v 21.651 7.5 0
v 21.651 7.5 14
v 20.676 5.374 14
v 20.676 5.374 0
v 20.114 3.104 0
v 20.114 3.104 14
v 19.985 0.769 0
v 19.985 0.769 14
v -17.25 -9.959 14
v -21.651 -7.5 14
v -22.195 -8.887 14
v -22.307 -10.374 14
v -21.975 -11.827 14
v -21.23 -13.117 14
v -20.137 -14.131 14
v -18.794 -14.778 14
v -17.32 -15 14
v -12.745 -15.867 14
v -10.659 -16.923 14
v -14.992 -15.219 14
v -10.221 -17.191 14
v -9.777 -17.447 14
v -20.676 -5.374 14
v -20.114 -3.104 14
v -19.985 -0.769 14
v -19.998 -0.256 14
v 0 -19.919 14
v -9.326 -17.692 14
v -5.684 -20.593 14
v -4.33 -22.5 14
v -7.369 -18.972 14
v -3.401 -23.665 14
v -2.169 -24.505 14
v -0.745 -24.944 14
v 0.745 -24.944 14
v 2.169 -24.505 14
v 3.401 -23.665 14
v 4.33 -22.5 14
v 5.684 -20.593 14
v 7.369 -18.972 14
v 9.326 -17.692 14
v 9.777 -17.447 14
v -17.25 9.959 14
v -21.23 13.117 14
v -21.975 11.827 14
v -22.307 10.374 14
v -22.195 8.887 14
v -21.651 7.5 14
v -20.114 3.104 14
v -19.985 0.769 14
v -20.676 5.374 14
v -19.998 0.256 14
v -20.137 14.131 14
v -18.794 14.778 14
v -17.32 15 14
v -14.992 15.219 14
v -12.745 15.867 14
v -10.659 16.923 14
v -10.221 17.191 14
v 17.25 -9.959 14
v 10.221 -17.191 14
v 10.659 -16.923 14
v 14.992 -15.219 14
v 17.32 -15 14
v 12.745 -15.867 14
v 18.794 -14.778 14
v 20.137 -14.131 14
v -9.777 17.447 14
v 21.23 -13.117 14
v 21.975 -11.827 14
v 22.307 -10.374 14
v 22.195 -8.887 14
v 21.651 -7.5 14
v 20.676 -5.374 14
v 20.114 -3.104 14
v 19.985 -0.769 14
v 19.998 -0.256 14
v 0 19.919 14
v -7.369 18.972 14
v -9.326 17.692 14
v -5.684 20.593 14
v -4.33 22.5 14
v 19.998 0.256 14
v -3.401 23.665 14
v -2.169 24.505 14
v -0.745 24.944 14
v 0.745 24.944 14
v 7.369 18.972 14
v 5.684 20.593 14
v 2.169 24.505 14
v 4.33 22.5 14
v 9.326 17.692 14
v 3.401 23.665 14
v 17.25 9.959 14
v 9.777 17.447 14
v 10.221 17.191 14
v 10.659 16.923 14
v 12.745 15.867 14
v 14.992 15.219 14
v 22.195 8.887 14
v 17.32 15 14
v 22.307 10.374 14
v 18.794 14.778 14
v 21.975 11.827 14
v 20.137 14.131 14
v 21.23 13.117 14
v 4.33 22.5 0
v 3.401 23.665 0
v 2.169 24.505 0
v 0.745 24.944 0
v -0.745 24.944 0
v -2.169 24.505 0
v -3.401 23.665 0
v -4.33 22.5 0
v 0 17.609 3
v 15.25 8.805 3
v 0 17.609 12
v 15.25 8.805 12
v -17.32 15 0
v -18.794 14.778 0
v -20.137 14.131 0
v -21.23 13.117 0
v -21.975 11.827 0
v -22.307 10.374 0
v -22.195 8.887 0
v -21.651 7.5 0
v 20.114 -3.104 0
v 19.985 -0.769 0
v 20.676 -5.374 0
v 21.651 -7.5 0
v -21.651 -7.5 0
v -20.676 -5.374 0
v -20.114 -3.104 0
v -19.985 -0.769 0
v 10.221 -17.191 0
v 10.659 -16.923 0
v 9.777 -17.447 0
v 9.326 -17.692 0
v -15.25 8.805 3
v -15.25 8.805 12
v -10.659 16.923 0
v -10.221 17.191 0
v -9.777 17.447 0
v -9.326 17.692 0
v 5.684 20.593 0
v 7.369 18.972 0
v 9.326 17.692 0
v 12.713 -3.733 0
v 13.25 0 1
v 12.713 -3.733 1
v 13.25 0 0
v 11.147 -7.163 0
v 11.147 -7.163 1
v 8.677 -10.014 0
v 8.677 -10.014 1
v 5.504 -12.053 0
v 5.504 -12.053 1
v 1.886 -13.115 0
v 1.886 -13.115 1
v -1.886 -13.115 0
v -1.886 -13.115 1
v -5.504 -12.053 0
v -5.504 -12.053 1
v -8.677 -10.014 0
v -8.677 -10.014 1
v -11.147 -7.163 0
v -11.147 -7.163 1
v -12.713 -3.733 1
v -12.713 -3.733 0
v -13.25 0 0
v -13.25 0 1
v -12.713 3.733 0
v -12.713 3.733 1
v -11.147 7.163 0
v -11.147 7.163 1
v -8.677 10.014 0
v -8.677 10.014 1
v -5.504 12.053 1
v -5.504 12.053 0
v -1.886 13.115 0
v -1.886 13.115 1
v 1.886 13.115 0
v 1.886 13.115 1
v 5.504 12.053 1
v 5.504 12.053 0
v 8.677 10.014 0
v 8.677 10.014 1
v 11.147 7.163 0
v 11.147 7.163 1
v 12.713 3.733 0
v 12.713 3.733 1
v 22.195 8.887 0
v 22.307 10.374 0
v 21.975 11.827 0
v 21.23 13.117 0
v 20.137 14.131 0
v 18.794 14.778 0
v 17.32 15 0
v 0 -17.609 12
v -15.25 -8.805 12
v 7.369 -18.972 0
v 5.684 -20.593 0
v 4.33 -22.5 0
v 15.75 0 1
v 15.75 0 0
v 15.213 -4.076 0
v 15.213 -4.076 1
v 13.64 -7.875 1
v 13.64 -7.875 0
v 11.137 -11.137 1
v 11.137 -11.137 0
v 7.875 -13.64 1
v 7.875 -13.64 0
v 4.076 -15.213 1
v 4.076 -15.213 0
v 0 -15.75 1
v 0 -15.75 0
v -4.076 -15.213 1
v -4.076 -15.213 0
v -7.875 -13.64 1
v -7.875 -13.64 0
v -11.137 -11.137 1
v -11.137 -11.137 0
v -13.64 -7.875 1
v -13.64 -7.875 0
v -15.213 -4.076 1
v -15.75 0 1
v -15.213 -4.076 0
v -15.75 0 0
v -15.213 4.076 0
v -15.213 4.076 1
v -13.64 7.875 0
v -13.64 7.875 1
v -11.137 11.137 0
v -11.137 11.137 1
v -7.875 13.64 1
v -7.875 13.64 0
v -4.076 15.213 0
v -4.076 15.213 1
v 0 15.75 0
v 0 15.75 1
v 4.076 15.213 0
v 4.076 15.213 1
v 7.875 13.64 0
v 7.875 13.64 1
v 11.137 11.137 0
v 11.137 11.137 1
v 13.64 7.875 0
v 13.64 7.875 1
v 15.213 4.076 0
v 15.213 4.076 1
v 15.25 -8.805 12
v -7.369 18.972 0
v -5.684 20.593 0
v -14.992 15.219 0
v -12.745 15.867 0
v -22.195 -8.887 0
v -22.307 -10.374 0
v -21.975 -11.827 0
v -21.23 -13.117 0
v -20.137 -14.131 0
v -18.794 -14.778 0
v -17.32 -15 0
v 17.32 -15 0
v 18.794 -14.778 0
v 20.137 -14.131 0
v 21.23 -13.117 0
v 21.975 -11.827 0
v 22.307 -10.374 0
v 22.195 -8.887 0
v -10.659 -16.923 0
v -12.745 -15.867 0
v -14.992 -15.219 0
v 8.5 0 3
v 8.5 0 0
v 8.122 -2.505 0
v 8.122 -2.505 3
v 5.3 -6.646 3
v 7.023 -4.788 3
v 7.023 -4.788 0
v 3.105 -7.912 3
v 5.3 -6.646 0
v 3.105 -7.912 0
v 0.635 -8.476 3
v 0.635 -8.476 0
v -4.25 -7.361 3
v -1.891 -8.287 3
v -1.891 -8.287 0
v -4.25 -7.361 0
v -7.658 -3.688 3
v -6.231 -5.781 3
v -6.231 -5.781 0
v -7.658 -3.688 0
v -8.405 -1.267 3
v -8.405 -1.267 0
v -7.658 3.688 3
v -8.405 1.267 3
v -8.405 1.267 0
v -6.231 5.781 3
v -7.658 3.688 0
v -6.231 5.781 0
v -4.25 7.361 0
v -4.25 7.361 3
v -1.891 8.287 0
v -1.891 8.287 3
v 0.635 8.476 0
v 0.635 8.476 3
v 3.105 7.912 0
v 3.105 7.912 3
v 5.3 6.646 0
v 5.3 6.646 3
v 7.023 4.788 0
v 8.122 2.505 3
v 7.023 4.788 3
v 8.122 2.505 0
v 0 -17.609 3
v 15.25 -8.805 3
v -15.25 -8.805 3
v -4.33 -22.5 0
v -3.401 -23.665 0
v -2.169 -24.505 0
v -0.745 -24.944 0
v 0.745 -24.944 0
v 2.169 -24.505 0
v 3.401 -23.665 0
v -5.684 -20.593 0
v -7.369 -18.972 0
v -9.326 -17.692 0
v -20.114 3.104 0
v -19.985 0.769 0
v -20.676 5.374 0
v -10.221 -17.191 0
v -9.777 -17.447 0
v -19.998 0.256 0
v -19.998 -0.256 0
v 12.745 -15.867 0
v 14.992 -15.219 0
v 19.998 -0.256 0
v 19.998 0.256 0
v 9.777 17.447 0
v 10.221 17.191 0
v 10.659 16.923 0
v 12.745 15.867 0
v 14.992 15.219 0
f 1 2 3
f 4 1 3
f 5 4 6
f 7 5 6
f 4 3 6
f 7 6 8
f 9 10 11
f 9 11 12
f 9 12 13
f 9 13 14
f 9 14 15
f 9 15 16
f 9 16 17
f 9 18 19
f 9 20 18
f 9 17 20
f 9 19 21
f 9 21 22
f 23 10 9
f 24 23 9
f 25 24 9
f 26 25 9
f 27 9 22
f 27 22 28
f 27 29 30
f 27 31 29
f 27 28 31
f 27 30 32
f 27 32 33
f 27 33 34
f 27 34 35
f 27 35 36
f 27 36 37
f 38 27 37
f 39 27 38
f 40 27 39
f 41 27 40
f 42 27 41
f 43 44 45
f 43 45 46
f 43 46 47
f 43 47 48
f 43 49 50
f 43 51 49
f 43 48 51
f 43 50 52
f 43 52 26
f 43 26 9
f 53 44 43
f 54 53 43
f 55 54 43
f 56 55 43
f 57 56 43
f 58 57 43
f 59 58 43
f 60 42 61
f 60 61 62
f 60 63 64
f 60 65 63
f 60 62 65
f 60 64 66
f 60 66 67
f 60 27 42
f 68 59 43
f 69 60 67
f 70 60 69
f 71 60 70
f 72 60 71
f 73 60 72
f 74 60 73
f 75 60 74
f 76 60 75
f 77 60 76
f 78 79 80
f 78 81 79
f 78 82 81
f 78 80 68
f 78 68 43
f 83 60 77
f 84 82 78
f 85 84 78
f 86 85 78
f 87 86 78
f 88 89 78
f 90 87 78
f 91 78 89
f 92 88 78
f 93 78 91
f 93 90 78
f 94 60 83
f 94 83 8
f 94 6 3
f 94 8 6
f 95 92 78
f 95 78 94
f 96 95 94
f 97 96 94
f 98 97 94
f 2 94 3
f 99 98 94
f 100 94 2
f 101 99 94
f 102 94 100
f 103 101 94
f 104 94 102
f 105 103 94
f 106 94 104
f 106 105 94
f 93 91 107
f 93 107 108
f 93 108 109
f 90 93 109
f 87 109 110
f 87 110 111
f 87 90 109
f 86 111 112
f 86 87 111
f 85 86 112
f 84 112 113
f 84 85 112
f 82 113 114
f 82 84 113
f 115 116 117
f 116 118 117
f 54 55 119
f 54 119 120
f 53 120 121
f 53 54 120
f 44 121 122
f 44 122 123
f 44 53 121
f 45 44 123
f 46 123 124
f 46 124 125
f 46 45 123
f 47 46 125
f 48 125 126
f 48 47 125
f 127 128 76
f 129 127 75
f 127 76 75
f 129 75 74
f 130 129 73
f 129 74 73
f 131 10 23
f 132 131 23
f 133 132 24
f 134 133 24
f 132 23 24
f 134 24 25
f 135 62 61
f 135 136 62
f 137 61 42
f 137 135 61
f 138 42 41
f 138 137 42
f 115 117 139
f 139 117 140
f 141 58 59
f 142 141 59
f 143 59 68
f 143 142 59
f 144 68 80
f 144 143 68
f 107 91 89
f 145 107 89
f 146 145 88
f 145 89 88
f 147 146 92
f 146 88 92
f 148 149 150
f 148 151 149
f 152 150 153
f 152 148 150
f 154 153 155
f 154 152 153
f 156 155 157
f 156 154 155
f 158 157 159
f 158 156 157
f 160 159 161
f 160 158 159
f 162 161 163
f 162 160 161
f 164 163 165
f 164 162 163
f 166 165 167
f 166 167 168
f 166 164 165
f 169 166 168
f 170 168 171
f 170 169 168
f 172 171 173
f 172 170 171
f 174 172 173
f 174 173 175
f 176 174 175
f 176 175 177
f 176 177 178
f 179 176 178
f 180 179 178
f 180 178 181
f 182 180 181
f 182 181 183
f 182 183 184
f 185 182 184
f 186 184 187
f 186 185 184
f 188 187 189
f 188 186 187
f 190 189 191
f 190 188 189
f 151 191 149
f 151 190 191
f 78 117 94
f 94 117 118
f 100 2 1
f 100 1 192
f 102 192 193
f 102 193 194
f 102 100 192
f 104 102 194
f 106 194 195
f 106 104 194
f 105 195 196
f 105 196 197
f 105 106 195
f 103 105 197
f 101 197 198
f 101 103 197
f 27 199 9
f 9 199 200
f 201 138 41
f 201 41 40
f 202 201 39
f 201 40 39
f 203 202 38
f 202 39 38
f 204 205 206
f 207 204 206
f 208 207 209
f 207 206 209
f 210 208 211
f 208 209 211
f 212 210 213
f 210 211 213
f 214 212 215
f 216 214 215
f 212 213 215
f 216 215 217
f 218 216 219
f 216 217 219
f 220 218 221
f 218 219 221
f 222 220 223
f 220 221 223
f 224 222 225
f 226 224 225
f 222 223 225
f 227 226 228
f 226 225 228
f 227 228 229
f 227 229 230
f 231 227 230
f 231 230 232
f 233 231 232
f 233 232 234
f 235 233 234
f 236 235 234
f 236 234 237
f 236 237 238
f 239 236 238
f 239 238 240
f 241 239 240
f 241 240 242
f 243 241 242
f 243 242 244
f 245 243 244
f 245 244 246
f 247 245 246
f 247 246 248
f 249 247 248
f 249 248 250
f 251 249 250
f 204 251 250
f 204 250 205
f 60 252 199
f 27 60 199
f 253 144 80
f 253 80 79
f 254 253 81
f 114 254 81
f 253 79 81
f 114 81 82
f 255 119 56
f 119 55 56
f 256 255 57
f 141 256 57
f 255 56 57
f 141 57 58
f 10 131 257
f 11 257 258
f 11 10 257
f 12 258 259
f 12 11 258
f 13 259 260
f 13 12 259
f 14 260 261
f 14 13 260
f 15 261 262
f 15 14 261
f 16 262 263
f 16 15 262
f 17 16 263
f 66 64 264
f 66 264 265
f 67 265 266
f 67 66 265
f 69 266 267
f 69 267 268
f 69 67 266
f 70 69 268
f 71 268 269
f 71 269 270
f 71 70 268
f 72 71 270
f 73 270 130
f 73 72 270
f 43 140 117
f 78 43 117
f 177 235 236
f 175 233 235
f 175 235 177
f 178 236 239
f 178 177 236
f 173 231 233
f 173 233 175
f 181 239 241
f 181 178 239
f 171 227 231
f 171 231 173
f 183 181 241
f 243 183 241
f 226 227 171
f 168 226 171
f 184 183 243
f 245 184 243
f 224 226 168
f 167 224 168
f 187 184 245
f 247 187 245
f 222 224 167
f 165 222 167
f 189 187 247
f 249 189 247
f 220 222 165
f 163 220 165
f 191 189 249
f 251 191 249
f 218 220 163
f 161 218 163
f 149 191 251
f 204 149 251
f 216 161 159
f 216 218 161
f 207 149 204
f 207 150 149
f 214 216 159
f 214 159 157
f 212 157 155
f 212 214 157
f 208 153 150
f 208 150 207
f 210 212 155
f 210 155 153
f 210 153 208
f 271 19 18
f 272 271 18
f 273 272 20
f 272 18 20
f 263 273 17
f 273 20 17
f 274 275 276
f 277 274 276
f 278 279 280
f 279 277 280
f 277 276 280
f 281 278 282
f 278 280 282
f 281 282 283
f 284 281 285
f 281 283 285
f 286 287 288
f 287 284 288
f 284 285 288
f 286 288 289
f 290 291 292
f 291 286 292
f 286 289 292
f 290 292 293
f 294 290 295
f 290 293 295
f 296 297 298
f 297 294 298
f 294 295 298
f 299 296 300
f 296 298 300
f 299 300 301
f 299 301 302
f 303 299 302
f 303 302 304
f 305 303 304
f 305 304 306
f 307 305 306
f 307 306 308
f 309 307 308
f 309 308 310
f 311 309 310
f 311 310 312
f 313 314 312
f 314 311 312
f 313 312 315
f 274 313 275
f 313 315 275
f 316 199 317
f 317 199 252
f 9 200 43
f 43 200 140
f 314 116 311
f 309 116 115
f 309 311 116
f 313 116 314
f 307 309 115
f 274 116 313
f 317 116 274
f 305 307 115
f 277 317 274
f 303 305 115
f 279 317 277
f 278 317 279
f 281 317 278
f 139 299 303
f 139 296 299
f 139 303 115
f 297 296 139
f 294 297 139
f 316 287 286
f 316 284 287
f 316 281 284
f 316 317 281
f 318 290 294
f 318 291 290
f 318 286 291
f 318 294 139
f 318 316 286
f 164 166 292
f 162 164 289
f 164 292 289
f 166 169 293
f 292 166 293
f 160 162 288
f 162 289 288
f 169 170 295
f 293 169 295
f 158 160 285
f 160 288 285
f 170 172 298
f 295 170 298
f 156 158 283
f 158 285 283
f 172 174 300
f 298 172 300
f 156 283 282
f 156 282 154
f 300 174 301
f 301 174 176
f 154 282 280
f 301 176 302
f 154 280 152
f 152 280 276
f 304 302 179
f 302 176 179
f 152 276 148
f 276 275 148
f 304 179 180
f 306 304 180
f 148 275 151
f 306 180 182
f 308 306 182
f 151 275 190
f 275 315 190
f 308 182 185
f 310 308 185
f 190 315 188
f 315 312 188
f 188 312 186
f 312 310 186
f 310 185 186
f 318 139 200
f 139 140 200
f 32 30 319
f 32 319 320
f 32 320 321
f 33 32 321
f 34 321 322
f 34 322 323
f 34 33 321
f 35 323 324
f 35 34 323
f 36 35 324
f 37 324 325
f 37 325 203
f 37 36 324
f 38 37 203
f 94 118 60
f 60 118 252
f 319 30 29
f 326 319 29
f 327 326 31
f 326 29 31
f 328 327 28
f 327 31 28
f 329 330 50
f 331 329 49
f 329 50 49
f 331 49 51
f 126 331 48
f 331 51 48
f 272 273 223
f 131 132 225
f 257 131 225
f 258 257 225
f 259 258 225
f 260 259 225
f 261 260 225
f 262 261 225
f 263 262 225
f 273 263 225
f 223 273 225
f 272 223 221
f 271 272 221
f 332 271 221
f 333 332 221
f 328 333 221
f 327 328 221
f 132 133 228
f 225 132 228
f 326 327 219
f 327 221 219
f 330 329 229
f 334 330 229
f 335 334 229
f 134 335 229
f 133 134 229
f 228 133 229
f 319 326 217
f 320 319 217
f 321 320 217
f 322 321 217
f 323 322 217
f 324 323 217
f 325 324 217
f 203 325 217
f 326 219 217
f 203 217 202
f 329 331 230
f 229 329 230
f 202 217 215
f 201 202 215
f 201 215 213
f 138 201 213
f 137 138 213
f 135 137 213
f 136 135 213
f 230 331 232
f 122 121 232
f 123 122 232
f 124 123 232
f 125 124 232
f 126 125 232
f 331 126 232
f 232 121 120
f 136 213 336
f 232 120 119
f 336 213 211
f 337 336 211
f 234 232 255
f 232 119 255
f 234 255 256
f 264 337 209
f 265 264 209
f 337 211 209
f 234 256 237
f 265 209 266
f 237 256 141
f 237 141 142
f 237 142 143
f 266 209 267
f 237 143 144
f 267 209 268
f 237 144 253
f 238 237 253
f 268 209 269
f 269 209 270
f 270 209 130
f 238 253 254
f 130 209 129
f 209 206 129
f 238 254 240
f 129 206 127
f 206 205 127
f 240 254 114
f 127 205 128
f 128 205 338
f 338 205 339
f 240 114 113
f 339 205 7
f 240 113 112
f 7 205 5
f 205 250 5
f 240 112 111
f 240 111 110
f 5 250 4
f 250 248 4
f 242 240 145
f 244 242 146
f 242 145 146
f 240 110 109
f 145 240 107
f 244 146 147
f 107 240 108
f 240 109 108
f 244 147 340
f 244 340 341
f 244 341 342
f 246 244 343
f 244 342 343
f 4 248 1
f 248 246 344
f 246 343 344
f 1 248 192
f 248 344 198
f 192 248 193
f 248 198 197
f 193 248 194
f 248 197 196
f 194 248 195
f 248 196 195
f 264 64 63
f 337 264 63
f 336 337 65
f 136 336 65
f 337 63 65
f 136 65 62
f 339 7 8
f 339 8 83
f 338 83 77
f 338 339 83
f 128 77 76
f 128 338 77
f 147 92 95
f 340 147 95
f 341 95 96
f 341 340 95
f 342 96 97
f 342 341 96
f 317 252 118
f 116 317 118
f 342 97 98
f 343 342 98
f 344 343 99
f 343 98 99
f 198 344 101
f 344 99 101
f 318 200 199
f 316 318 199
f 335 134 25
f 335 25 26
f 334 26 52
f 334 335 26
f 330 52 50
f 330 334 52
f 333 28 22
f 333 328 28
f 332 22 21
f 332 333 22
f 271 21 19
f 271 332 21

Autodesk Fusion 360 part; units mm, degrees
sketch "Sketch1" plane through (0, 0, 0) normal (0, 0, 1) x (1, 0, 0)
  circle A0 centre (0, 0) radius 8.5
  circle A1 centre (0, 0) radius 20
  dimension "d1" = 17
  dimension "d2" = 40
extrude "Extrude1" add sketch "Sketch1" along normal blind 14
sketch "Sketch2" plane through (0, 0, 14) normal (0, 0, 1) x (-1, 0, 0)
  circle A0 centre (0, 0) radius 8.5
  circle A1 centre (0, 0) radius 20
  line L0 (-15.25, -8.8046) -> (0, -17.6092)
  line L1 (0, -17.6092) -> (15.25, -8.8046)
  line L2 (15.25, -8.8046) -> (15.25, 8.8046)
  line L3 (15.25, 8.8046) -> (0, 17.6092)
  line L4 (0, 17.6092) -> (-15.25, 8.8046)
  line L5 (-15.25, 8.8046) -> (-15.25, -8.8046)
  line L6 (0, 0) -> (0, -24.7489) construction
  dimension "d5" = 15.25
extrude "Extrude2" cut sketch "Sketch2" against normal blind 11 contours L0 L1 L2 L3 L4 L5
sketch "Sketch3" plane through (0, 0, 14) normal (0, 0, 1) x (-1, 0, 0)
  line L0 (0, -17.6092) -> (-15.25, -8.8046)
  line L1 (-15.25, -8.8046) -> (-15.25, 8.8046)
  line L2 (-15.25, 8.8046) -> (0, 17.6092)
  line L3 (0, 17.6092) -> (15.25, 8.8046)
  line L4 (15.25, 8.8046) -> (15.25, -8.8046)
  line L5 (15.25, -8.8046) -> (0, -17.6092)
  circle A0 centre (0, 0) radius 20
  line L6 (0, -20) -> (0, 20) construction
  line L7 (20, 0) -> (-20, 0) construction
  arc A1 (-4.3301, -22.5) -> (4.3301, -22.5) centre (0, -20) ccw
  line L8 (0, -20) -> (0, -25) construction
  line L9 (0, -20) -> (4.3301, -22.5) construction
  line L10 (0, -20) -> (-4.3301, -22.5) construction
  arc A2 (9.3264, -17.6923) -> (4.3301, -22.5) centre (15.1554, -28.75) ccw
  arc A3 (-4.3301, -22.5) -> (-9.3264, -17.6923) centre (-15.1554, -28.75) ccw
  arc A4 (-9.3264, -17.6923) -> (9.3264, -17.6923) centre (0, 0) ccw
  arc A5 (17.3205, -15) -> (21.6506, -7.5) centre (17.3205, -10) ccw
  arc A6 (17.3205, -15) -> (10.6588, -16.9231) centre (17.3205, -27.5) ccw
  arc A7 (10.6588, -16.9231) -> (19.9852, -0.7692) centre (0, 0) ccw
  arc A8 (19.9852, -0.7692) -> (21.6506, -7.5) centre (32.476, -1.25) ccw
  arc A9 (21.6506, 7.5) -> (17.3205, 15) centre (17.3205, 10) ccw
  arc A10 (21.6506, 7.5) -> (19.9852, 0.7692) centre (32.476, 1.25) ccw
  arc A11 (19.9852, 0.7692) -> (10.6588, 16.9231) centre (0, 0) ccw
  arc A12 (10.6588, 16.9231) -> (17.3205, 15) centre (17.3205, 27.5) ccw
  arc A13 (4.3301, 22.5) -> (-4.3301, 22.5) centre (0, 20) ccw
  arc A14 (4.3301, 22.5) -> (9.3264, 17.6923) centre (15.1554, 28.75) ccw
  arc A15 (9.3264, 17.6923) -> (-9.3264, 17.6923) centre (0, 0) ccw
  arc A16 (-9.3264, 17.6923) -> (-4.3301, 22.5) centre (-15.1554, 28.75) ccw
  arc A17 (-17.3205, 15) -> (-21.6506, 7.5) centre (-17.3205, 10) ccw
  arc A18 (-17.3205, 15) -> (-10.6588, 16.9231) centre (-17.3205, 27.5) ccw
  arc A19 (-10.6588, 16.9231) -> (-19.9852, 0.7692) centre (0, 0) ccw
  arc A20 (-19.9852, 0.7692) -> (-21.6506, 7.5) centre (-32.476, 1.25) ccw
  arc A21 (-21.6506, -7.5) -> (-17.3205, -15) centre (-17.3205, -10) ccw
  arc A22 (-21.6506, -7.5) -> (-19.9852, -0.7692) centre (-32.476, -1.25) ccw
  arc A23 (-19.9852, -0.7692) -> (-10.6588, -16.9231) centre (0, 0) ccw
  arc A24 (-10.6588, -16.9231) -> (-17.3205, -15) centre (-17.3205, -27.5) ccw
  dimension "d10" = 60
  dimension "d11" = 60
  dimension "d12" = 5
  dimension "d14" = 360
extrude "Extrude3" add sketch "Sketch3" against normal up to surface (14 mm away) contours A0 A9 A10 A11 A12 | A0 A5 A6 A7 A8 | A0 A13 A14 A15 A16 | A0 A1 A2 A3 A4 | A0 A17 A18 A19 A20 | A0 A21 A22 A23 A24
chamfer "Chamfer1" distance 2 angle 45 6 edges at (-7.625, 13.2069, 14) (-15.25, 0, 14) (-7.625, -13.2069, 14) (7.625, -13.2069, 14) (15.25, 0, 14) (7.625, 13.2069, 14)
sketch "Sketch4" plane through (0, 0, 0) normal (0, 0, -1) x (1, 0, 0)
  circle A0 centre (0, 0) radius 8.5
  arc A1 (-9.3264, 17.6923) -> (-10.6588, 16.9231) centre (0, 0) ccw
  arc A2 (-17.3205, 15) -> (-10.6588, 16.9231) centre (-17.3205, 27.5) ccw
  arc A3 (-17.3205, 15) -> (-21.6506, 7.5) centre (-17.3205, 10) ccw
  arc A4 (-19.9852, 0.7692) -> (-21.6506, 7.5) centre (-32.476, 1.25) ccw
  arc A5 (-19.9852, 0.7692) -> (-19.9852, -0.7692) centre (0, 0) ccw
  arc A6 (-21.6506, -7.5) -> (-19.9852, -0.7692) centre (-32.476, -1.25) ccw
  arc A7 (-21.6506, -7.5) -> (-17.3205, -15) centre (-17.3205, -10) ccw
  arc A8 (-10.6588, -16.9231) -> (-17.3205, -15) centre (-17.3205, -27.5) ccw
  arc A9 (-10.6588, -16.9231) -> (-9.3264, -17.6923) centre (0, 0) ccw
  arc A10 (-4.3301, -22.5) -> (-9.3264, -17.6923) centre (-15.1554, -28.75) ccw
  arc A11 (-4.3301, -22.5) -> (4.3301, -22.5) centre (0, -20) ccw
  arc A12 (9.3264, -17.6923) -> (4.3301, -22.5) centre (15.1554, -28.75) ccw
  arc A13 (9.3264, -17.6923) -> (10.6588, -16.9231) centre (0, 0) ccw
  arc A14 (17.3205, -15) -> (10.6588, -16.9231) centre (17.3205, -27.5) ccw
  arc A15 (17.3205, -15) -> (21.6506, -7.5) centre (17.3205, -10) ccw
  arc A16 (19.9852, -0.7692) -> (21.6506, -7.5) centre (32.476, -1.25) ccw
  arc A17 (19.9852, -0.7692) -> (19.9852, 0.7692) centre (0, 0) ccw
  arc A18 (21.6506, 7.5) -> (19.9852, 0.7692) centre (32.476, 1.25) ccw
  arc A19 (21.6506, 7.5) -> (17.3205, 15) centre (17.3205, 10) ccw
  arc A20 (10.6588, 16.9231) -> (17.3205, 15) centre (17.3205, 27.5) ccw
  arc A21 (10.6588, 16.9231) -> (9.3264, 17.6923) centre (0, 0) ccw
  arc A22 (4.3301, 22.5) -> (9.3264, 17.6923) centre (15.1554, 28.75) ccw
  arc A23 (4.3301, 22.5) -> (-4.3301, 22.5) centre (0, 20) ccw
  arc A24 (-9.3264, 17.6923) -> (-4.3301, 22.5) centre (-15.1554, 28.75) ccw
  circle A25 centre (0, 0) radius 13.25
  circle A26 centre (0, 0) radius 15.75
  dimension "d18" = 26.5
  dimension "d19" = 31.5
extrude "Extrude4" cut sketch "Sketch4" against normal blind 1 contours A26
equation "d11 = d10"
